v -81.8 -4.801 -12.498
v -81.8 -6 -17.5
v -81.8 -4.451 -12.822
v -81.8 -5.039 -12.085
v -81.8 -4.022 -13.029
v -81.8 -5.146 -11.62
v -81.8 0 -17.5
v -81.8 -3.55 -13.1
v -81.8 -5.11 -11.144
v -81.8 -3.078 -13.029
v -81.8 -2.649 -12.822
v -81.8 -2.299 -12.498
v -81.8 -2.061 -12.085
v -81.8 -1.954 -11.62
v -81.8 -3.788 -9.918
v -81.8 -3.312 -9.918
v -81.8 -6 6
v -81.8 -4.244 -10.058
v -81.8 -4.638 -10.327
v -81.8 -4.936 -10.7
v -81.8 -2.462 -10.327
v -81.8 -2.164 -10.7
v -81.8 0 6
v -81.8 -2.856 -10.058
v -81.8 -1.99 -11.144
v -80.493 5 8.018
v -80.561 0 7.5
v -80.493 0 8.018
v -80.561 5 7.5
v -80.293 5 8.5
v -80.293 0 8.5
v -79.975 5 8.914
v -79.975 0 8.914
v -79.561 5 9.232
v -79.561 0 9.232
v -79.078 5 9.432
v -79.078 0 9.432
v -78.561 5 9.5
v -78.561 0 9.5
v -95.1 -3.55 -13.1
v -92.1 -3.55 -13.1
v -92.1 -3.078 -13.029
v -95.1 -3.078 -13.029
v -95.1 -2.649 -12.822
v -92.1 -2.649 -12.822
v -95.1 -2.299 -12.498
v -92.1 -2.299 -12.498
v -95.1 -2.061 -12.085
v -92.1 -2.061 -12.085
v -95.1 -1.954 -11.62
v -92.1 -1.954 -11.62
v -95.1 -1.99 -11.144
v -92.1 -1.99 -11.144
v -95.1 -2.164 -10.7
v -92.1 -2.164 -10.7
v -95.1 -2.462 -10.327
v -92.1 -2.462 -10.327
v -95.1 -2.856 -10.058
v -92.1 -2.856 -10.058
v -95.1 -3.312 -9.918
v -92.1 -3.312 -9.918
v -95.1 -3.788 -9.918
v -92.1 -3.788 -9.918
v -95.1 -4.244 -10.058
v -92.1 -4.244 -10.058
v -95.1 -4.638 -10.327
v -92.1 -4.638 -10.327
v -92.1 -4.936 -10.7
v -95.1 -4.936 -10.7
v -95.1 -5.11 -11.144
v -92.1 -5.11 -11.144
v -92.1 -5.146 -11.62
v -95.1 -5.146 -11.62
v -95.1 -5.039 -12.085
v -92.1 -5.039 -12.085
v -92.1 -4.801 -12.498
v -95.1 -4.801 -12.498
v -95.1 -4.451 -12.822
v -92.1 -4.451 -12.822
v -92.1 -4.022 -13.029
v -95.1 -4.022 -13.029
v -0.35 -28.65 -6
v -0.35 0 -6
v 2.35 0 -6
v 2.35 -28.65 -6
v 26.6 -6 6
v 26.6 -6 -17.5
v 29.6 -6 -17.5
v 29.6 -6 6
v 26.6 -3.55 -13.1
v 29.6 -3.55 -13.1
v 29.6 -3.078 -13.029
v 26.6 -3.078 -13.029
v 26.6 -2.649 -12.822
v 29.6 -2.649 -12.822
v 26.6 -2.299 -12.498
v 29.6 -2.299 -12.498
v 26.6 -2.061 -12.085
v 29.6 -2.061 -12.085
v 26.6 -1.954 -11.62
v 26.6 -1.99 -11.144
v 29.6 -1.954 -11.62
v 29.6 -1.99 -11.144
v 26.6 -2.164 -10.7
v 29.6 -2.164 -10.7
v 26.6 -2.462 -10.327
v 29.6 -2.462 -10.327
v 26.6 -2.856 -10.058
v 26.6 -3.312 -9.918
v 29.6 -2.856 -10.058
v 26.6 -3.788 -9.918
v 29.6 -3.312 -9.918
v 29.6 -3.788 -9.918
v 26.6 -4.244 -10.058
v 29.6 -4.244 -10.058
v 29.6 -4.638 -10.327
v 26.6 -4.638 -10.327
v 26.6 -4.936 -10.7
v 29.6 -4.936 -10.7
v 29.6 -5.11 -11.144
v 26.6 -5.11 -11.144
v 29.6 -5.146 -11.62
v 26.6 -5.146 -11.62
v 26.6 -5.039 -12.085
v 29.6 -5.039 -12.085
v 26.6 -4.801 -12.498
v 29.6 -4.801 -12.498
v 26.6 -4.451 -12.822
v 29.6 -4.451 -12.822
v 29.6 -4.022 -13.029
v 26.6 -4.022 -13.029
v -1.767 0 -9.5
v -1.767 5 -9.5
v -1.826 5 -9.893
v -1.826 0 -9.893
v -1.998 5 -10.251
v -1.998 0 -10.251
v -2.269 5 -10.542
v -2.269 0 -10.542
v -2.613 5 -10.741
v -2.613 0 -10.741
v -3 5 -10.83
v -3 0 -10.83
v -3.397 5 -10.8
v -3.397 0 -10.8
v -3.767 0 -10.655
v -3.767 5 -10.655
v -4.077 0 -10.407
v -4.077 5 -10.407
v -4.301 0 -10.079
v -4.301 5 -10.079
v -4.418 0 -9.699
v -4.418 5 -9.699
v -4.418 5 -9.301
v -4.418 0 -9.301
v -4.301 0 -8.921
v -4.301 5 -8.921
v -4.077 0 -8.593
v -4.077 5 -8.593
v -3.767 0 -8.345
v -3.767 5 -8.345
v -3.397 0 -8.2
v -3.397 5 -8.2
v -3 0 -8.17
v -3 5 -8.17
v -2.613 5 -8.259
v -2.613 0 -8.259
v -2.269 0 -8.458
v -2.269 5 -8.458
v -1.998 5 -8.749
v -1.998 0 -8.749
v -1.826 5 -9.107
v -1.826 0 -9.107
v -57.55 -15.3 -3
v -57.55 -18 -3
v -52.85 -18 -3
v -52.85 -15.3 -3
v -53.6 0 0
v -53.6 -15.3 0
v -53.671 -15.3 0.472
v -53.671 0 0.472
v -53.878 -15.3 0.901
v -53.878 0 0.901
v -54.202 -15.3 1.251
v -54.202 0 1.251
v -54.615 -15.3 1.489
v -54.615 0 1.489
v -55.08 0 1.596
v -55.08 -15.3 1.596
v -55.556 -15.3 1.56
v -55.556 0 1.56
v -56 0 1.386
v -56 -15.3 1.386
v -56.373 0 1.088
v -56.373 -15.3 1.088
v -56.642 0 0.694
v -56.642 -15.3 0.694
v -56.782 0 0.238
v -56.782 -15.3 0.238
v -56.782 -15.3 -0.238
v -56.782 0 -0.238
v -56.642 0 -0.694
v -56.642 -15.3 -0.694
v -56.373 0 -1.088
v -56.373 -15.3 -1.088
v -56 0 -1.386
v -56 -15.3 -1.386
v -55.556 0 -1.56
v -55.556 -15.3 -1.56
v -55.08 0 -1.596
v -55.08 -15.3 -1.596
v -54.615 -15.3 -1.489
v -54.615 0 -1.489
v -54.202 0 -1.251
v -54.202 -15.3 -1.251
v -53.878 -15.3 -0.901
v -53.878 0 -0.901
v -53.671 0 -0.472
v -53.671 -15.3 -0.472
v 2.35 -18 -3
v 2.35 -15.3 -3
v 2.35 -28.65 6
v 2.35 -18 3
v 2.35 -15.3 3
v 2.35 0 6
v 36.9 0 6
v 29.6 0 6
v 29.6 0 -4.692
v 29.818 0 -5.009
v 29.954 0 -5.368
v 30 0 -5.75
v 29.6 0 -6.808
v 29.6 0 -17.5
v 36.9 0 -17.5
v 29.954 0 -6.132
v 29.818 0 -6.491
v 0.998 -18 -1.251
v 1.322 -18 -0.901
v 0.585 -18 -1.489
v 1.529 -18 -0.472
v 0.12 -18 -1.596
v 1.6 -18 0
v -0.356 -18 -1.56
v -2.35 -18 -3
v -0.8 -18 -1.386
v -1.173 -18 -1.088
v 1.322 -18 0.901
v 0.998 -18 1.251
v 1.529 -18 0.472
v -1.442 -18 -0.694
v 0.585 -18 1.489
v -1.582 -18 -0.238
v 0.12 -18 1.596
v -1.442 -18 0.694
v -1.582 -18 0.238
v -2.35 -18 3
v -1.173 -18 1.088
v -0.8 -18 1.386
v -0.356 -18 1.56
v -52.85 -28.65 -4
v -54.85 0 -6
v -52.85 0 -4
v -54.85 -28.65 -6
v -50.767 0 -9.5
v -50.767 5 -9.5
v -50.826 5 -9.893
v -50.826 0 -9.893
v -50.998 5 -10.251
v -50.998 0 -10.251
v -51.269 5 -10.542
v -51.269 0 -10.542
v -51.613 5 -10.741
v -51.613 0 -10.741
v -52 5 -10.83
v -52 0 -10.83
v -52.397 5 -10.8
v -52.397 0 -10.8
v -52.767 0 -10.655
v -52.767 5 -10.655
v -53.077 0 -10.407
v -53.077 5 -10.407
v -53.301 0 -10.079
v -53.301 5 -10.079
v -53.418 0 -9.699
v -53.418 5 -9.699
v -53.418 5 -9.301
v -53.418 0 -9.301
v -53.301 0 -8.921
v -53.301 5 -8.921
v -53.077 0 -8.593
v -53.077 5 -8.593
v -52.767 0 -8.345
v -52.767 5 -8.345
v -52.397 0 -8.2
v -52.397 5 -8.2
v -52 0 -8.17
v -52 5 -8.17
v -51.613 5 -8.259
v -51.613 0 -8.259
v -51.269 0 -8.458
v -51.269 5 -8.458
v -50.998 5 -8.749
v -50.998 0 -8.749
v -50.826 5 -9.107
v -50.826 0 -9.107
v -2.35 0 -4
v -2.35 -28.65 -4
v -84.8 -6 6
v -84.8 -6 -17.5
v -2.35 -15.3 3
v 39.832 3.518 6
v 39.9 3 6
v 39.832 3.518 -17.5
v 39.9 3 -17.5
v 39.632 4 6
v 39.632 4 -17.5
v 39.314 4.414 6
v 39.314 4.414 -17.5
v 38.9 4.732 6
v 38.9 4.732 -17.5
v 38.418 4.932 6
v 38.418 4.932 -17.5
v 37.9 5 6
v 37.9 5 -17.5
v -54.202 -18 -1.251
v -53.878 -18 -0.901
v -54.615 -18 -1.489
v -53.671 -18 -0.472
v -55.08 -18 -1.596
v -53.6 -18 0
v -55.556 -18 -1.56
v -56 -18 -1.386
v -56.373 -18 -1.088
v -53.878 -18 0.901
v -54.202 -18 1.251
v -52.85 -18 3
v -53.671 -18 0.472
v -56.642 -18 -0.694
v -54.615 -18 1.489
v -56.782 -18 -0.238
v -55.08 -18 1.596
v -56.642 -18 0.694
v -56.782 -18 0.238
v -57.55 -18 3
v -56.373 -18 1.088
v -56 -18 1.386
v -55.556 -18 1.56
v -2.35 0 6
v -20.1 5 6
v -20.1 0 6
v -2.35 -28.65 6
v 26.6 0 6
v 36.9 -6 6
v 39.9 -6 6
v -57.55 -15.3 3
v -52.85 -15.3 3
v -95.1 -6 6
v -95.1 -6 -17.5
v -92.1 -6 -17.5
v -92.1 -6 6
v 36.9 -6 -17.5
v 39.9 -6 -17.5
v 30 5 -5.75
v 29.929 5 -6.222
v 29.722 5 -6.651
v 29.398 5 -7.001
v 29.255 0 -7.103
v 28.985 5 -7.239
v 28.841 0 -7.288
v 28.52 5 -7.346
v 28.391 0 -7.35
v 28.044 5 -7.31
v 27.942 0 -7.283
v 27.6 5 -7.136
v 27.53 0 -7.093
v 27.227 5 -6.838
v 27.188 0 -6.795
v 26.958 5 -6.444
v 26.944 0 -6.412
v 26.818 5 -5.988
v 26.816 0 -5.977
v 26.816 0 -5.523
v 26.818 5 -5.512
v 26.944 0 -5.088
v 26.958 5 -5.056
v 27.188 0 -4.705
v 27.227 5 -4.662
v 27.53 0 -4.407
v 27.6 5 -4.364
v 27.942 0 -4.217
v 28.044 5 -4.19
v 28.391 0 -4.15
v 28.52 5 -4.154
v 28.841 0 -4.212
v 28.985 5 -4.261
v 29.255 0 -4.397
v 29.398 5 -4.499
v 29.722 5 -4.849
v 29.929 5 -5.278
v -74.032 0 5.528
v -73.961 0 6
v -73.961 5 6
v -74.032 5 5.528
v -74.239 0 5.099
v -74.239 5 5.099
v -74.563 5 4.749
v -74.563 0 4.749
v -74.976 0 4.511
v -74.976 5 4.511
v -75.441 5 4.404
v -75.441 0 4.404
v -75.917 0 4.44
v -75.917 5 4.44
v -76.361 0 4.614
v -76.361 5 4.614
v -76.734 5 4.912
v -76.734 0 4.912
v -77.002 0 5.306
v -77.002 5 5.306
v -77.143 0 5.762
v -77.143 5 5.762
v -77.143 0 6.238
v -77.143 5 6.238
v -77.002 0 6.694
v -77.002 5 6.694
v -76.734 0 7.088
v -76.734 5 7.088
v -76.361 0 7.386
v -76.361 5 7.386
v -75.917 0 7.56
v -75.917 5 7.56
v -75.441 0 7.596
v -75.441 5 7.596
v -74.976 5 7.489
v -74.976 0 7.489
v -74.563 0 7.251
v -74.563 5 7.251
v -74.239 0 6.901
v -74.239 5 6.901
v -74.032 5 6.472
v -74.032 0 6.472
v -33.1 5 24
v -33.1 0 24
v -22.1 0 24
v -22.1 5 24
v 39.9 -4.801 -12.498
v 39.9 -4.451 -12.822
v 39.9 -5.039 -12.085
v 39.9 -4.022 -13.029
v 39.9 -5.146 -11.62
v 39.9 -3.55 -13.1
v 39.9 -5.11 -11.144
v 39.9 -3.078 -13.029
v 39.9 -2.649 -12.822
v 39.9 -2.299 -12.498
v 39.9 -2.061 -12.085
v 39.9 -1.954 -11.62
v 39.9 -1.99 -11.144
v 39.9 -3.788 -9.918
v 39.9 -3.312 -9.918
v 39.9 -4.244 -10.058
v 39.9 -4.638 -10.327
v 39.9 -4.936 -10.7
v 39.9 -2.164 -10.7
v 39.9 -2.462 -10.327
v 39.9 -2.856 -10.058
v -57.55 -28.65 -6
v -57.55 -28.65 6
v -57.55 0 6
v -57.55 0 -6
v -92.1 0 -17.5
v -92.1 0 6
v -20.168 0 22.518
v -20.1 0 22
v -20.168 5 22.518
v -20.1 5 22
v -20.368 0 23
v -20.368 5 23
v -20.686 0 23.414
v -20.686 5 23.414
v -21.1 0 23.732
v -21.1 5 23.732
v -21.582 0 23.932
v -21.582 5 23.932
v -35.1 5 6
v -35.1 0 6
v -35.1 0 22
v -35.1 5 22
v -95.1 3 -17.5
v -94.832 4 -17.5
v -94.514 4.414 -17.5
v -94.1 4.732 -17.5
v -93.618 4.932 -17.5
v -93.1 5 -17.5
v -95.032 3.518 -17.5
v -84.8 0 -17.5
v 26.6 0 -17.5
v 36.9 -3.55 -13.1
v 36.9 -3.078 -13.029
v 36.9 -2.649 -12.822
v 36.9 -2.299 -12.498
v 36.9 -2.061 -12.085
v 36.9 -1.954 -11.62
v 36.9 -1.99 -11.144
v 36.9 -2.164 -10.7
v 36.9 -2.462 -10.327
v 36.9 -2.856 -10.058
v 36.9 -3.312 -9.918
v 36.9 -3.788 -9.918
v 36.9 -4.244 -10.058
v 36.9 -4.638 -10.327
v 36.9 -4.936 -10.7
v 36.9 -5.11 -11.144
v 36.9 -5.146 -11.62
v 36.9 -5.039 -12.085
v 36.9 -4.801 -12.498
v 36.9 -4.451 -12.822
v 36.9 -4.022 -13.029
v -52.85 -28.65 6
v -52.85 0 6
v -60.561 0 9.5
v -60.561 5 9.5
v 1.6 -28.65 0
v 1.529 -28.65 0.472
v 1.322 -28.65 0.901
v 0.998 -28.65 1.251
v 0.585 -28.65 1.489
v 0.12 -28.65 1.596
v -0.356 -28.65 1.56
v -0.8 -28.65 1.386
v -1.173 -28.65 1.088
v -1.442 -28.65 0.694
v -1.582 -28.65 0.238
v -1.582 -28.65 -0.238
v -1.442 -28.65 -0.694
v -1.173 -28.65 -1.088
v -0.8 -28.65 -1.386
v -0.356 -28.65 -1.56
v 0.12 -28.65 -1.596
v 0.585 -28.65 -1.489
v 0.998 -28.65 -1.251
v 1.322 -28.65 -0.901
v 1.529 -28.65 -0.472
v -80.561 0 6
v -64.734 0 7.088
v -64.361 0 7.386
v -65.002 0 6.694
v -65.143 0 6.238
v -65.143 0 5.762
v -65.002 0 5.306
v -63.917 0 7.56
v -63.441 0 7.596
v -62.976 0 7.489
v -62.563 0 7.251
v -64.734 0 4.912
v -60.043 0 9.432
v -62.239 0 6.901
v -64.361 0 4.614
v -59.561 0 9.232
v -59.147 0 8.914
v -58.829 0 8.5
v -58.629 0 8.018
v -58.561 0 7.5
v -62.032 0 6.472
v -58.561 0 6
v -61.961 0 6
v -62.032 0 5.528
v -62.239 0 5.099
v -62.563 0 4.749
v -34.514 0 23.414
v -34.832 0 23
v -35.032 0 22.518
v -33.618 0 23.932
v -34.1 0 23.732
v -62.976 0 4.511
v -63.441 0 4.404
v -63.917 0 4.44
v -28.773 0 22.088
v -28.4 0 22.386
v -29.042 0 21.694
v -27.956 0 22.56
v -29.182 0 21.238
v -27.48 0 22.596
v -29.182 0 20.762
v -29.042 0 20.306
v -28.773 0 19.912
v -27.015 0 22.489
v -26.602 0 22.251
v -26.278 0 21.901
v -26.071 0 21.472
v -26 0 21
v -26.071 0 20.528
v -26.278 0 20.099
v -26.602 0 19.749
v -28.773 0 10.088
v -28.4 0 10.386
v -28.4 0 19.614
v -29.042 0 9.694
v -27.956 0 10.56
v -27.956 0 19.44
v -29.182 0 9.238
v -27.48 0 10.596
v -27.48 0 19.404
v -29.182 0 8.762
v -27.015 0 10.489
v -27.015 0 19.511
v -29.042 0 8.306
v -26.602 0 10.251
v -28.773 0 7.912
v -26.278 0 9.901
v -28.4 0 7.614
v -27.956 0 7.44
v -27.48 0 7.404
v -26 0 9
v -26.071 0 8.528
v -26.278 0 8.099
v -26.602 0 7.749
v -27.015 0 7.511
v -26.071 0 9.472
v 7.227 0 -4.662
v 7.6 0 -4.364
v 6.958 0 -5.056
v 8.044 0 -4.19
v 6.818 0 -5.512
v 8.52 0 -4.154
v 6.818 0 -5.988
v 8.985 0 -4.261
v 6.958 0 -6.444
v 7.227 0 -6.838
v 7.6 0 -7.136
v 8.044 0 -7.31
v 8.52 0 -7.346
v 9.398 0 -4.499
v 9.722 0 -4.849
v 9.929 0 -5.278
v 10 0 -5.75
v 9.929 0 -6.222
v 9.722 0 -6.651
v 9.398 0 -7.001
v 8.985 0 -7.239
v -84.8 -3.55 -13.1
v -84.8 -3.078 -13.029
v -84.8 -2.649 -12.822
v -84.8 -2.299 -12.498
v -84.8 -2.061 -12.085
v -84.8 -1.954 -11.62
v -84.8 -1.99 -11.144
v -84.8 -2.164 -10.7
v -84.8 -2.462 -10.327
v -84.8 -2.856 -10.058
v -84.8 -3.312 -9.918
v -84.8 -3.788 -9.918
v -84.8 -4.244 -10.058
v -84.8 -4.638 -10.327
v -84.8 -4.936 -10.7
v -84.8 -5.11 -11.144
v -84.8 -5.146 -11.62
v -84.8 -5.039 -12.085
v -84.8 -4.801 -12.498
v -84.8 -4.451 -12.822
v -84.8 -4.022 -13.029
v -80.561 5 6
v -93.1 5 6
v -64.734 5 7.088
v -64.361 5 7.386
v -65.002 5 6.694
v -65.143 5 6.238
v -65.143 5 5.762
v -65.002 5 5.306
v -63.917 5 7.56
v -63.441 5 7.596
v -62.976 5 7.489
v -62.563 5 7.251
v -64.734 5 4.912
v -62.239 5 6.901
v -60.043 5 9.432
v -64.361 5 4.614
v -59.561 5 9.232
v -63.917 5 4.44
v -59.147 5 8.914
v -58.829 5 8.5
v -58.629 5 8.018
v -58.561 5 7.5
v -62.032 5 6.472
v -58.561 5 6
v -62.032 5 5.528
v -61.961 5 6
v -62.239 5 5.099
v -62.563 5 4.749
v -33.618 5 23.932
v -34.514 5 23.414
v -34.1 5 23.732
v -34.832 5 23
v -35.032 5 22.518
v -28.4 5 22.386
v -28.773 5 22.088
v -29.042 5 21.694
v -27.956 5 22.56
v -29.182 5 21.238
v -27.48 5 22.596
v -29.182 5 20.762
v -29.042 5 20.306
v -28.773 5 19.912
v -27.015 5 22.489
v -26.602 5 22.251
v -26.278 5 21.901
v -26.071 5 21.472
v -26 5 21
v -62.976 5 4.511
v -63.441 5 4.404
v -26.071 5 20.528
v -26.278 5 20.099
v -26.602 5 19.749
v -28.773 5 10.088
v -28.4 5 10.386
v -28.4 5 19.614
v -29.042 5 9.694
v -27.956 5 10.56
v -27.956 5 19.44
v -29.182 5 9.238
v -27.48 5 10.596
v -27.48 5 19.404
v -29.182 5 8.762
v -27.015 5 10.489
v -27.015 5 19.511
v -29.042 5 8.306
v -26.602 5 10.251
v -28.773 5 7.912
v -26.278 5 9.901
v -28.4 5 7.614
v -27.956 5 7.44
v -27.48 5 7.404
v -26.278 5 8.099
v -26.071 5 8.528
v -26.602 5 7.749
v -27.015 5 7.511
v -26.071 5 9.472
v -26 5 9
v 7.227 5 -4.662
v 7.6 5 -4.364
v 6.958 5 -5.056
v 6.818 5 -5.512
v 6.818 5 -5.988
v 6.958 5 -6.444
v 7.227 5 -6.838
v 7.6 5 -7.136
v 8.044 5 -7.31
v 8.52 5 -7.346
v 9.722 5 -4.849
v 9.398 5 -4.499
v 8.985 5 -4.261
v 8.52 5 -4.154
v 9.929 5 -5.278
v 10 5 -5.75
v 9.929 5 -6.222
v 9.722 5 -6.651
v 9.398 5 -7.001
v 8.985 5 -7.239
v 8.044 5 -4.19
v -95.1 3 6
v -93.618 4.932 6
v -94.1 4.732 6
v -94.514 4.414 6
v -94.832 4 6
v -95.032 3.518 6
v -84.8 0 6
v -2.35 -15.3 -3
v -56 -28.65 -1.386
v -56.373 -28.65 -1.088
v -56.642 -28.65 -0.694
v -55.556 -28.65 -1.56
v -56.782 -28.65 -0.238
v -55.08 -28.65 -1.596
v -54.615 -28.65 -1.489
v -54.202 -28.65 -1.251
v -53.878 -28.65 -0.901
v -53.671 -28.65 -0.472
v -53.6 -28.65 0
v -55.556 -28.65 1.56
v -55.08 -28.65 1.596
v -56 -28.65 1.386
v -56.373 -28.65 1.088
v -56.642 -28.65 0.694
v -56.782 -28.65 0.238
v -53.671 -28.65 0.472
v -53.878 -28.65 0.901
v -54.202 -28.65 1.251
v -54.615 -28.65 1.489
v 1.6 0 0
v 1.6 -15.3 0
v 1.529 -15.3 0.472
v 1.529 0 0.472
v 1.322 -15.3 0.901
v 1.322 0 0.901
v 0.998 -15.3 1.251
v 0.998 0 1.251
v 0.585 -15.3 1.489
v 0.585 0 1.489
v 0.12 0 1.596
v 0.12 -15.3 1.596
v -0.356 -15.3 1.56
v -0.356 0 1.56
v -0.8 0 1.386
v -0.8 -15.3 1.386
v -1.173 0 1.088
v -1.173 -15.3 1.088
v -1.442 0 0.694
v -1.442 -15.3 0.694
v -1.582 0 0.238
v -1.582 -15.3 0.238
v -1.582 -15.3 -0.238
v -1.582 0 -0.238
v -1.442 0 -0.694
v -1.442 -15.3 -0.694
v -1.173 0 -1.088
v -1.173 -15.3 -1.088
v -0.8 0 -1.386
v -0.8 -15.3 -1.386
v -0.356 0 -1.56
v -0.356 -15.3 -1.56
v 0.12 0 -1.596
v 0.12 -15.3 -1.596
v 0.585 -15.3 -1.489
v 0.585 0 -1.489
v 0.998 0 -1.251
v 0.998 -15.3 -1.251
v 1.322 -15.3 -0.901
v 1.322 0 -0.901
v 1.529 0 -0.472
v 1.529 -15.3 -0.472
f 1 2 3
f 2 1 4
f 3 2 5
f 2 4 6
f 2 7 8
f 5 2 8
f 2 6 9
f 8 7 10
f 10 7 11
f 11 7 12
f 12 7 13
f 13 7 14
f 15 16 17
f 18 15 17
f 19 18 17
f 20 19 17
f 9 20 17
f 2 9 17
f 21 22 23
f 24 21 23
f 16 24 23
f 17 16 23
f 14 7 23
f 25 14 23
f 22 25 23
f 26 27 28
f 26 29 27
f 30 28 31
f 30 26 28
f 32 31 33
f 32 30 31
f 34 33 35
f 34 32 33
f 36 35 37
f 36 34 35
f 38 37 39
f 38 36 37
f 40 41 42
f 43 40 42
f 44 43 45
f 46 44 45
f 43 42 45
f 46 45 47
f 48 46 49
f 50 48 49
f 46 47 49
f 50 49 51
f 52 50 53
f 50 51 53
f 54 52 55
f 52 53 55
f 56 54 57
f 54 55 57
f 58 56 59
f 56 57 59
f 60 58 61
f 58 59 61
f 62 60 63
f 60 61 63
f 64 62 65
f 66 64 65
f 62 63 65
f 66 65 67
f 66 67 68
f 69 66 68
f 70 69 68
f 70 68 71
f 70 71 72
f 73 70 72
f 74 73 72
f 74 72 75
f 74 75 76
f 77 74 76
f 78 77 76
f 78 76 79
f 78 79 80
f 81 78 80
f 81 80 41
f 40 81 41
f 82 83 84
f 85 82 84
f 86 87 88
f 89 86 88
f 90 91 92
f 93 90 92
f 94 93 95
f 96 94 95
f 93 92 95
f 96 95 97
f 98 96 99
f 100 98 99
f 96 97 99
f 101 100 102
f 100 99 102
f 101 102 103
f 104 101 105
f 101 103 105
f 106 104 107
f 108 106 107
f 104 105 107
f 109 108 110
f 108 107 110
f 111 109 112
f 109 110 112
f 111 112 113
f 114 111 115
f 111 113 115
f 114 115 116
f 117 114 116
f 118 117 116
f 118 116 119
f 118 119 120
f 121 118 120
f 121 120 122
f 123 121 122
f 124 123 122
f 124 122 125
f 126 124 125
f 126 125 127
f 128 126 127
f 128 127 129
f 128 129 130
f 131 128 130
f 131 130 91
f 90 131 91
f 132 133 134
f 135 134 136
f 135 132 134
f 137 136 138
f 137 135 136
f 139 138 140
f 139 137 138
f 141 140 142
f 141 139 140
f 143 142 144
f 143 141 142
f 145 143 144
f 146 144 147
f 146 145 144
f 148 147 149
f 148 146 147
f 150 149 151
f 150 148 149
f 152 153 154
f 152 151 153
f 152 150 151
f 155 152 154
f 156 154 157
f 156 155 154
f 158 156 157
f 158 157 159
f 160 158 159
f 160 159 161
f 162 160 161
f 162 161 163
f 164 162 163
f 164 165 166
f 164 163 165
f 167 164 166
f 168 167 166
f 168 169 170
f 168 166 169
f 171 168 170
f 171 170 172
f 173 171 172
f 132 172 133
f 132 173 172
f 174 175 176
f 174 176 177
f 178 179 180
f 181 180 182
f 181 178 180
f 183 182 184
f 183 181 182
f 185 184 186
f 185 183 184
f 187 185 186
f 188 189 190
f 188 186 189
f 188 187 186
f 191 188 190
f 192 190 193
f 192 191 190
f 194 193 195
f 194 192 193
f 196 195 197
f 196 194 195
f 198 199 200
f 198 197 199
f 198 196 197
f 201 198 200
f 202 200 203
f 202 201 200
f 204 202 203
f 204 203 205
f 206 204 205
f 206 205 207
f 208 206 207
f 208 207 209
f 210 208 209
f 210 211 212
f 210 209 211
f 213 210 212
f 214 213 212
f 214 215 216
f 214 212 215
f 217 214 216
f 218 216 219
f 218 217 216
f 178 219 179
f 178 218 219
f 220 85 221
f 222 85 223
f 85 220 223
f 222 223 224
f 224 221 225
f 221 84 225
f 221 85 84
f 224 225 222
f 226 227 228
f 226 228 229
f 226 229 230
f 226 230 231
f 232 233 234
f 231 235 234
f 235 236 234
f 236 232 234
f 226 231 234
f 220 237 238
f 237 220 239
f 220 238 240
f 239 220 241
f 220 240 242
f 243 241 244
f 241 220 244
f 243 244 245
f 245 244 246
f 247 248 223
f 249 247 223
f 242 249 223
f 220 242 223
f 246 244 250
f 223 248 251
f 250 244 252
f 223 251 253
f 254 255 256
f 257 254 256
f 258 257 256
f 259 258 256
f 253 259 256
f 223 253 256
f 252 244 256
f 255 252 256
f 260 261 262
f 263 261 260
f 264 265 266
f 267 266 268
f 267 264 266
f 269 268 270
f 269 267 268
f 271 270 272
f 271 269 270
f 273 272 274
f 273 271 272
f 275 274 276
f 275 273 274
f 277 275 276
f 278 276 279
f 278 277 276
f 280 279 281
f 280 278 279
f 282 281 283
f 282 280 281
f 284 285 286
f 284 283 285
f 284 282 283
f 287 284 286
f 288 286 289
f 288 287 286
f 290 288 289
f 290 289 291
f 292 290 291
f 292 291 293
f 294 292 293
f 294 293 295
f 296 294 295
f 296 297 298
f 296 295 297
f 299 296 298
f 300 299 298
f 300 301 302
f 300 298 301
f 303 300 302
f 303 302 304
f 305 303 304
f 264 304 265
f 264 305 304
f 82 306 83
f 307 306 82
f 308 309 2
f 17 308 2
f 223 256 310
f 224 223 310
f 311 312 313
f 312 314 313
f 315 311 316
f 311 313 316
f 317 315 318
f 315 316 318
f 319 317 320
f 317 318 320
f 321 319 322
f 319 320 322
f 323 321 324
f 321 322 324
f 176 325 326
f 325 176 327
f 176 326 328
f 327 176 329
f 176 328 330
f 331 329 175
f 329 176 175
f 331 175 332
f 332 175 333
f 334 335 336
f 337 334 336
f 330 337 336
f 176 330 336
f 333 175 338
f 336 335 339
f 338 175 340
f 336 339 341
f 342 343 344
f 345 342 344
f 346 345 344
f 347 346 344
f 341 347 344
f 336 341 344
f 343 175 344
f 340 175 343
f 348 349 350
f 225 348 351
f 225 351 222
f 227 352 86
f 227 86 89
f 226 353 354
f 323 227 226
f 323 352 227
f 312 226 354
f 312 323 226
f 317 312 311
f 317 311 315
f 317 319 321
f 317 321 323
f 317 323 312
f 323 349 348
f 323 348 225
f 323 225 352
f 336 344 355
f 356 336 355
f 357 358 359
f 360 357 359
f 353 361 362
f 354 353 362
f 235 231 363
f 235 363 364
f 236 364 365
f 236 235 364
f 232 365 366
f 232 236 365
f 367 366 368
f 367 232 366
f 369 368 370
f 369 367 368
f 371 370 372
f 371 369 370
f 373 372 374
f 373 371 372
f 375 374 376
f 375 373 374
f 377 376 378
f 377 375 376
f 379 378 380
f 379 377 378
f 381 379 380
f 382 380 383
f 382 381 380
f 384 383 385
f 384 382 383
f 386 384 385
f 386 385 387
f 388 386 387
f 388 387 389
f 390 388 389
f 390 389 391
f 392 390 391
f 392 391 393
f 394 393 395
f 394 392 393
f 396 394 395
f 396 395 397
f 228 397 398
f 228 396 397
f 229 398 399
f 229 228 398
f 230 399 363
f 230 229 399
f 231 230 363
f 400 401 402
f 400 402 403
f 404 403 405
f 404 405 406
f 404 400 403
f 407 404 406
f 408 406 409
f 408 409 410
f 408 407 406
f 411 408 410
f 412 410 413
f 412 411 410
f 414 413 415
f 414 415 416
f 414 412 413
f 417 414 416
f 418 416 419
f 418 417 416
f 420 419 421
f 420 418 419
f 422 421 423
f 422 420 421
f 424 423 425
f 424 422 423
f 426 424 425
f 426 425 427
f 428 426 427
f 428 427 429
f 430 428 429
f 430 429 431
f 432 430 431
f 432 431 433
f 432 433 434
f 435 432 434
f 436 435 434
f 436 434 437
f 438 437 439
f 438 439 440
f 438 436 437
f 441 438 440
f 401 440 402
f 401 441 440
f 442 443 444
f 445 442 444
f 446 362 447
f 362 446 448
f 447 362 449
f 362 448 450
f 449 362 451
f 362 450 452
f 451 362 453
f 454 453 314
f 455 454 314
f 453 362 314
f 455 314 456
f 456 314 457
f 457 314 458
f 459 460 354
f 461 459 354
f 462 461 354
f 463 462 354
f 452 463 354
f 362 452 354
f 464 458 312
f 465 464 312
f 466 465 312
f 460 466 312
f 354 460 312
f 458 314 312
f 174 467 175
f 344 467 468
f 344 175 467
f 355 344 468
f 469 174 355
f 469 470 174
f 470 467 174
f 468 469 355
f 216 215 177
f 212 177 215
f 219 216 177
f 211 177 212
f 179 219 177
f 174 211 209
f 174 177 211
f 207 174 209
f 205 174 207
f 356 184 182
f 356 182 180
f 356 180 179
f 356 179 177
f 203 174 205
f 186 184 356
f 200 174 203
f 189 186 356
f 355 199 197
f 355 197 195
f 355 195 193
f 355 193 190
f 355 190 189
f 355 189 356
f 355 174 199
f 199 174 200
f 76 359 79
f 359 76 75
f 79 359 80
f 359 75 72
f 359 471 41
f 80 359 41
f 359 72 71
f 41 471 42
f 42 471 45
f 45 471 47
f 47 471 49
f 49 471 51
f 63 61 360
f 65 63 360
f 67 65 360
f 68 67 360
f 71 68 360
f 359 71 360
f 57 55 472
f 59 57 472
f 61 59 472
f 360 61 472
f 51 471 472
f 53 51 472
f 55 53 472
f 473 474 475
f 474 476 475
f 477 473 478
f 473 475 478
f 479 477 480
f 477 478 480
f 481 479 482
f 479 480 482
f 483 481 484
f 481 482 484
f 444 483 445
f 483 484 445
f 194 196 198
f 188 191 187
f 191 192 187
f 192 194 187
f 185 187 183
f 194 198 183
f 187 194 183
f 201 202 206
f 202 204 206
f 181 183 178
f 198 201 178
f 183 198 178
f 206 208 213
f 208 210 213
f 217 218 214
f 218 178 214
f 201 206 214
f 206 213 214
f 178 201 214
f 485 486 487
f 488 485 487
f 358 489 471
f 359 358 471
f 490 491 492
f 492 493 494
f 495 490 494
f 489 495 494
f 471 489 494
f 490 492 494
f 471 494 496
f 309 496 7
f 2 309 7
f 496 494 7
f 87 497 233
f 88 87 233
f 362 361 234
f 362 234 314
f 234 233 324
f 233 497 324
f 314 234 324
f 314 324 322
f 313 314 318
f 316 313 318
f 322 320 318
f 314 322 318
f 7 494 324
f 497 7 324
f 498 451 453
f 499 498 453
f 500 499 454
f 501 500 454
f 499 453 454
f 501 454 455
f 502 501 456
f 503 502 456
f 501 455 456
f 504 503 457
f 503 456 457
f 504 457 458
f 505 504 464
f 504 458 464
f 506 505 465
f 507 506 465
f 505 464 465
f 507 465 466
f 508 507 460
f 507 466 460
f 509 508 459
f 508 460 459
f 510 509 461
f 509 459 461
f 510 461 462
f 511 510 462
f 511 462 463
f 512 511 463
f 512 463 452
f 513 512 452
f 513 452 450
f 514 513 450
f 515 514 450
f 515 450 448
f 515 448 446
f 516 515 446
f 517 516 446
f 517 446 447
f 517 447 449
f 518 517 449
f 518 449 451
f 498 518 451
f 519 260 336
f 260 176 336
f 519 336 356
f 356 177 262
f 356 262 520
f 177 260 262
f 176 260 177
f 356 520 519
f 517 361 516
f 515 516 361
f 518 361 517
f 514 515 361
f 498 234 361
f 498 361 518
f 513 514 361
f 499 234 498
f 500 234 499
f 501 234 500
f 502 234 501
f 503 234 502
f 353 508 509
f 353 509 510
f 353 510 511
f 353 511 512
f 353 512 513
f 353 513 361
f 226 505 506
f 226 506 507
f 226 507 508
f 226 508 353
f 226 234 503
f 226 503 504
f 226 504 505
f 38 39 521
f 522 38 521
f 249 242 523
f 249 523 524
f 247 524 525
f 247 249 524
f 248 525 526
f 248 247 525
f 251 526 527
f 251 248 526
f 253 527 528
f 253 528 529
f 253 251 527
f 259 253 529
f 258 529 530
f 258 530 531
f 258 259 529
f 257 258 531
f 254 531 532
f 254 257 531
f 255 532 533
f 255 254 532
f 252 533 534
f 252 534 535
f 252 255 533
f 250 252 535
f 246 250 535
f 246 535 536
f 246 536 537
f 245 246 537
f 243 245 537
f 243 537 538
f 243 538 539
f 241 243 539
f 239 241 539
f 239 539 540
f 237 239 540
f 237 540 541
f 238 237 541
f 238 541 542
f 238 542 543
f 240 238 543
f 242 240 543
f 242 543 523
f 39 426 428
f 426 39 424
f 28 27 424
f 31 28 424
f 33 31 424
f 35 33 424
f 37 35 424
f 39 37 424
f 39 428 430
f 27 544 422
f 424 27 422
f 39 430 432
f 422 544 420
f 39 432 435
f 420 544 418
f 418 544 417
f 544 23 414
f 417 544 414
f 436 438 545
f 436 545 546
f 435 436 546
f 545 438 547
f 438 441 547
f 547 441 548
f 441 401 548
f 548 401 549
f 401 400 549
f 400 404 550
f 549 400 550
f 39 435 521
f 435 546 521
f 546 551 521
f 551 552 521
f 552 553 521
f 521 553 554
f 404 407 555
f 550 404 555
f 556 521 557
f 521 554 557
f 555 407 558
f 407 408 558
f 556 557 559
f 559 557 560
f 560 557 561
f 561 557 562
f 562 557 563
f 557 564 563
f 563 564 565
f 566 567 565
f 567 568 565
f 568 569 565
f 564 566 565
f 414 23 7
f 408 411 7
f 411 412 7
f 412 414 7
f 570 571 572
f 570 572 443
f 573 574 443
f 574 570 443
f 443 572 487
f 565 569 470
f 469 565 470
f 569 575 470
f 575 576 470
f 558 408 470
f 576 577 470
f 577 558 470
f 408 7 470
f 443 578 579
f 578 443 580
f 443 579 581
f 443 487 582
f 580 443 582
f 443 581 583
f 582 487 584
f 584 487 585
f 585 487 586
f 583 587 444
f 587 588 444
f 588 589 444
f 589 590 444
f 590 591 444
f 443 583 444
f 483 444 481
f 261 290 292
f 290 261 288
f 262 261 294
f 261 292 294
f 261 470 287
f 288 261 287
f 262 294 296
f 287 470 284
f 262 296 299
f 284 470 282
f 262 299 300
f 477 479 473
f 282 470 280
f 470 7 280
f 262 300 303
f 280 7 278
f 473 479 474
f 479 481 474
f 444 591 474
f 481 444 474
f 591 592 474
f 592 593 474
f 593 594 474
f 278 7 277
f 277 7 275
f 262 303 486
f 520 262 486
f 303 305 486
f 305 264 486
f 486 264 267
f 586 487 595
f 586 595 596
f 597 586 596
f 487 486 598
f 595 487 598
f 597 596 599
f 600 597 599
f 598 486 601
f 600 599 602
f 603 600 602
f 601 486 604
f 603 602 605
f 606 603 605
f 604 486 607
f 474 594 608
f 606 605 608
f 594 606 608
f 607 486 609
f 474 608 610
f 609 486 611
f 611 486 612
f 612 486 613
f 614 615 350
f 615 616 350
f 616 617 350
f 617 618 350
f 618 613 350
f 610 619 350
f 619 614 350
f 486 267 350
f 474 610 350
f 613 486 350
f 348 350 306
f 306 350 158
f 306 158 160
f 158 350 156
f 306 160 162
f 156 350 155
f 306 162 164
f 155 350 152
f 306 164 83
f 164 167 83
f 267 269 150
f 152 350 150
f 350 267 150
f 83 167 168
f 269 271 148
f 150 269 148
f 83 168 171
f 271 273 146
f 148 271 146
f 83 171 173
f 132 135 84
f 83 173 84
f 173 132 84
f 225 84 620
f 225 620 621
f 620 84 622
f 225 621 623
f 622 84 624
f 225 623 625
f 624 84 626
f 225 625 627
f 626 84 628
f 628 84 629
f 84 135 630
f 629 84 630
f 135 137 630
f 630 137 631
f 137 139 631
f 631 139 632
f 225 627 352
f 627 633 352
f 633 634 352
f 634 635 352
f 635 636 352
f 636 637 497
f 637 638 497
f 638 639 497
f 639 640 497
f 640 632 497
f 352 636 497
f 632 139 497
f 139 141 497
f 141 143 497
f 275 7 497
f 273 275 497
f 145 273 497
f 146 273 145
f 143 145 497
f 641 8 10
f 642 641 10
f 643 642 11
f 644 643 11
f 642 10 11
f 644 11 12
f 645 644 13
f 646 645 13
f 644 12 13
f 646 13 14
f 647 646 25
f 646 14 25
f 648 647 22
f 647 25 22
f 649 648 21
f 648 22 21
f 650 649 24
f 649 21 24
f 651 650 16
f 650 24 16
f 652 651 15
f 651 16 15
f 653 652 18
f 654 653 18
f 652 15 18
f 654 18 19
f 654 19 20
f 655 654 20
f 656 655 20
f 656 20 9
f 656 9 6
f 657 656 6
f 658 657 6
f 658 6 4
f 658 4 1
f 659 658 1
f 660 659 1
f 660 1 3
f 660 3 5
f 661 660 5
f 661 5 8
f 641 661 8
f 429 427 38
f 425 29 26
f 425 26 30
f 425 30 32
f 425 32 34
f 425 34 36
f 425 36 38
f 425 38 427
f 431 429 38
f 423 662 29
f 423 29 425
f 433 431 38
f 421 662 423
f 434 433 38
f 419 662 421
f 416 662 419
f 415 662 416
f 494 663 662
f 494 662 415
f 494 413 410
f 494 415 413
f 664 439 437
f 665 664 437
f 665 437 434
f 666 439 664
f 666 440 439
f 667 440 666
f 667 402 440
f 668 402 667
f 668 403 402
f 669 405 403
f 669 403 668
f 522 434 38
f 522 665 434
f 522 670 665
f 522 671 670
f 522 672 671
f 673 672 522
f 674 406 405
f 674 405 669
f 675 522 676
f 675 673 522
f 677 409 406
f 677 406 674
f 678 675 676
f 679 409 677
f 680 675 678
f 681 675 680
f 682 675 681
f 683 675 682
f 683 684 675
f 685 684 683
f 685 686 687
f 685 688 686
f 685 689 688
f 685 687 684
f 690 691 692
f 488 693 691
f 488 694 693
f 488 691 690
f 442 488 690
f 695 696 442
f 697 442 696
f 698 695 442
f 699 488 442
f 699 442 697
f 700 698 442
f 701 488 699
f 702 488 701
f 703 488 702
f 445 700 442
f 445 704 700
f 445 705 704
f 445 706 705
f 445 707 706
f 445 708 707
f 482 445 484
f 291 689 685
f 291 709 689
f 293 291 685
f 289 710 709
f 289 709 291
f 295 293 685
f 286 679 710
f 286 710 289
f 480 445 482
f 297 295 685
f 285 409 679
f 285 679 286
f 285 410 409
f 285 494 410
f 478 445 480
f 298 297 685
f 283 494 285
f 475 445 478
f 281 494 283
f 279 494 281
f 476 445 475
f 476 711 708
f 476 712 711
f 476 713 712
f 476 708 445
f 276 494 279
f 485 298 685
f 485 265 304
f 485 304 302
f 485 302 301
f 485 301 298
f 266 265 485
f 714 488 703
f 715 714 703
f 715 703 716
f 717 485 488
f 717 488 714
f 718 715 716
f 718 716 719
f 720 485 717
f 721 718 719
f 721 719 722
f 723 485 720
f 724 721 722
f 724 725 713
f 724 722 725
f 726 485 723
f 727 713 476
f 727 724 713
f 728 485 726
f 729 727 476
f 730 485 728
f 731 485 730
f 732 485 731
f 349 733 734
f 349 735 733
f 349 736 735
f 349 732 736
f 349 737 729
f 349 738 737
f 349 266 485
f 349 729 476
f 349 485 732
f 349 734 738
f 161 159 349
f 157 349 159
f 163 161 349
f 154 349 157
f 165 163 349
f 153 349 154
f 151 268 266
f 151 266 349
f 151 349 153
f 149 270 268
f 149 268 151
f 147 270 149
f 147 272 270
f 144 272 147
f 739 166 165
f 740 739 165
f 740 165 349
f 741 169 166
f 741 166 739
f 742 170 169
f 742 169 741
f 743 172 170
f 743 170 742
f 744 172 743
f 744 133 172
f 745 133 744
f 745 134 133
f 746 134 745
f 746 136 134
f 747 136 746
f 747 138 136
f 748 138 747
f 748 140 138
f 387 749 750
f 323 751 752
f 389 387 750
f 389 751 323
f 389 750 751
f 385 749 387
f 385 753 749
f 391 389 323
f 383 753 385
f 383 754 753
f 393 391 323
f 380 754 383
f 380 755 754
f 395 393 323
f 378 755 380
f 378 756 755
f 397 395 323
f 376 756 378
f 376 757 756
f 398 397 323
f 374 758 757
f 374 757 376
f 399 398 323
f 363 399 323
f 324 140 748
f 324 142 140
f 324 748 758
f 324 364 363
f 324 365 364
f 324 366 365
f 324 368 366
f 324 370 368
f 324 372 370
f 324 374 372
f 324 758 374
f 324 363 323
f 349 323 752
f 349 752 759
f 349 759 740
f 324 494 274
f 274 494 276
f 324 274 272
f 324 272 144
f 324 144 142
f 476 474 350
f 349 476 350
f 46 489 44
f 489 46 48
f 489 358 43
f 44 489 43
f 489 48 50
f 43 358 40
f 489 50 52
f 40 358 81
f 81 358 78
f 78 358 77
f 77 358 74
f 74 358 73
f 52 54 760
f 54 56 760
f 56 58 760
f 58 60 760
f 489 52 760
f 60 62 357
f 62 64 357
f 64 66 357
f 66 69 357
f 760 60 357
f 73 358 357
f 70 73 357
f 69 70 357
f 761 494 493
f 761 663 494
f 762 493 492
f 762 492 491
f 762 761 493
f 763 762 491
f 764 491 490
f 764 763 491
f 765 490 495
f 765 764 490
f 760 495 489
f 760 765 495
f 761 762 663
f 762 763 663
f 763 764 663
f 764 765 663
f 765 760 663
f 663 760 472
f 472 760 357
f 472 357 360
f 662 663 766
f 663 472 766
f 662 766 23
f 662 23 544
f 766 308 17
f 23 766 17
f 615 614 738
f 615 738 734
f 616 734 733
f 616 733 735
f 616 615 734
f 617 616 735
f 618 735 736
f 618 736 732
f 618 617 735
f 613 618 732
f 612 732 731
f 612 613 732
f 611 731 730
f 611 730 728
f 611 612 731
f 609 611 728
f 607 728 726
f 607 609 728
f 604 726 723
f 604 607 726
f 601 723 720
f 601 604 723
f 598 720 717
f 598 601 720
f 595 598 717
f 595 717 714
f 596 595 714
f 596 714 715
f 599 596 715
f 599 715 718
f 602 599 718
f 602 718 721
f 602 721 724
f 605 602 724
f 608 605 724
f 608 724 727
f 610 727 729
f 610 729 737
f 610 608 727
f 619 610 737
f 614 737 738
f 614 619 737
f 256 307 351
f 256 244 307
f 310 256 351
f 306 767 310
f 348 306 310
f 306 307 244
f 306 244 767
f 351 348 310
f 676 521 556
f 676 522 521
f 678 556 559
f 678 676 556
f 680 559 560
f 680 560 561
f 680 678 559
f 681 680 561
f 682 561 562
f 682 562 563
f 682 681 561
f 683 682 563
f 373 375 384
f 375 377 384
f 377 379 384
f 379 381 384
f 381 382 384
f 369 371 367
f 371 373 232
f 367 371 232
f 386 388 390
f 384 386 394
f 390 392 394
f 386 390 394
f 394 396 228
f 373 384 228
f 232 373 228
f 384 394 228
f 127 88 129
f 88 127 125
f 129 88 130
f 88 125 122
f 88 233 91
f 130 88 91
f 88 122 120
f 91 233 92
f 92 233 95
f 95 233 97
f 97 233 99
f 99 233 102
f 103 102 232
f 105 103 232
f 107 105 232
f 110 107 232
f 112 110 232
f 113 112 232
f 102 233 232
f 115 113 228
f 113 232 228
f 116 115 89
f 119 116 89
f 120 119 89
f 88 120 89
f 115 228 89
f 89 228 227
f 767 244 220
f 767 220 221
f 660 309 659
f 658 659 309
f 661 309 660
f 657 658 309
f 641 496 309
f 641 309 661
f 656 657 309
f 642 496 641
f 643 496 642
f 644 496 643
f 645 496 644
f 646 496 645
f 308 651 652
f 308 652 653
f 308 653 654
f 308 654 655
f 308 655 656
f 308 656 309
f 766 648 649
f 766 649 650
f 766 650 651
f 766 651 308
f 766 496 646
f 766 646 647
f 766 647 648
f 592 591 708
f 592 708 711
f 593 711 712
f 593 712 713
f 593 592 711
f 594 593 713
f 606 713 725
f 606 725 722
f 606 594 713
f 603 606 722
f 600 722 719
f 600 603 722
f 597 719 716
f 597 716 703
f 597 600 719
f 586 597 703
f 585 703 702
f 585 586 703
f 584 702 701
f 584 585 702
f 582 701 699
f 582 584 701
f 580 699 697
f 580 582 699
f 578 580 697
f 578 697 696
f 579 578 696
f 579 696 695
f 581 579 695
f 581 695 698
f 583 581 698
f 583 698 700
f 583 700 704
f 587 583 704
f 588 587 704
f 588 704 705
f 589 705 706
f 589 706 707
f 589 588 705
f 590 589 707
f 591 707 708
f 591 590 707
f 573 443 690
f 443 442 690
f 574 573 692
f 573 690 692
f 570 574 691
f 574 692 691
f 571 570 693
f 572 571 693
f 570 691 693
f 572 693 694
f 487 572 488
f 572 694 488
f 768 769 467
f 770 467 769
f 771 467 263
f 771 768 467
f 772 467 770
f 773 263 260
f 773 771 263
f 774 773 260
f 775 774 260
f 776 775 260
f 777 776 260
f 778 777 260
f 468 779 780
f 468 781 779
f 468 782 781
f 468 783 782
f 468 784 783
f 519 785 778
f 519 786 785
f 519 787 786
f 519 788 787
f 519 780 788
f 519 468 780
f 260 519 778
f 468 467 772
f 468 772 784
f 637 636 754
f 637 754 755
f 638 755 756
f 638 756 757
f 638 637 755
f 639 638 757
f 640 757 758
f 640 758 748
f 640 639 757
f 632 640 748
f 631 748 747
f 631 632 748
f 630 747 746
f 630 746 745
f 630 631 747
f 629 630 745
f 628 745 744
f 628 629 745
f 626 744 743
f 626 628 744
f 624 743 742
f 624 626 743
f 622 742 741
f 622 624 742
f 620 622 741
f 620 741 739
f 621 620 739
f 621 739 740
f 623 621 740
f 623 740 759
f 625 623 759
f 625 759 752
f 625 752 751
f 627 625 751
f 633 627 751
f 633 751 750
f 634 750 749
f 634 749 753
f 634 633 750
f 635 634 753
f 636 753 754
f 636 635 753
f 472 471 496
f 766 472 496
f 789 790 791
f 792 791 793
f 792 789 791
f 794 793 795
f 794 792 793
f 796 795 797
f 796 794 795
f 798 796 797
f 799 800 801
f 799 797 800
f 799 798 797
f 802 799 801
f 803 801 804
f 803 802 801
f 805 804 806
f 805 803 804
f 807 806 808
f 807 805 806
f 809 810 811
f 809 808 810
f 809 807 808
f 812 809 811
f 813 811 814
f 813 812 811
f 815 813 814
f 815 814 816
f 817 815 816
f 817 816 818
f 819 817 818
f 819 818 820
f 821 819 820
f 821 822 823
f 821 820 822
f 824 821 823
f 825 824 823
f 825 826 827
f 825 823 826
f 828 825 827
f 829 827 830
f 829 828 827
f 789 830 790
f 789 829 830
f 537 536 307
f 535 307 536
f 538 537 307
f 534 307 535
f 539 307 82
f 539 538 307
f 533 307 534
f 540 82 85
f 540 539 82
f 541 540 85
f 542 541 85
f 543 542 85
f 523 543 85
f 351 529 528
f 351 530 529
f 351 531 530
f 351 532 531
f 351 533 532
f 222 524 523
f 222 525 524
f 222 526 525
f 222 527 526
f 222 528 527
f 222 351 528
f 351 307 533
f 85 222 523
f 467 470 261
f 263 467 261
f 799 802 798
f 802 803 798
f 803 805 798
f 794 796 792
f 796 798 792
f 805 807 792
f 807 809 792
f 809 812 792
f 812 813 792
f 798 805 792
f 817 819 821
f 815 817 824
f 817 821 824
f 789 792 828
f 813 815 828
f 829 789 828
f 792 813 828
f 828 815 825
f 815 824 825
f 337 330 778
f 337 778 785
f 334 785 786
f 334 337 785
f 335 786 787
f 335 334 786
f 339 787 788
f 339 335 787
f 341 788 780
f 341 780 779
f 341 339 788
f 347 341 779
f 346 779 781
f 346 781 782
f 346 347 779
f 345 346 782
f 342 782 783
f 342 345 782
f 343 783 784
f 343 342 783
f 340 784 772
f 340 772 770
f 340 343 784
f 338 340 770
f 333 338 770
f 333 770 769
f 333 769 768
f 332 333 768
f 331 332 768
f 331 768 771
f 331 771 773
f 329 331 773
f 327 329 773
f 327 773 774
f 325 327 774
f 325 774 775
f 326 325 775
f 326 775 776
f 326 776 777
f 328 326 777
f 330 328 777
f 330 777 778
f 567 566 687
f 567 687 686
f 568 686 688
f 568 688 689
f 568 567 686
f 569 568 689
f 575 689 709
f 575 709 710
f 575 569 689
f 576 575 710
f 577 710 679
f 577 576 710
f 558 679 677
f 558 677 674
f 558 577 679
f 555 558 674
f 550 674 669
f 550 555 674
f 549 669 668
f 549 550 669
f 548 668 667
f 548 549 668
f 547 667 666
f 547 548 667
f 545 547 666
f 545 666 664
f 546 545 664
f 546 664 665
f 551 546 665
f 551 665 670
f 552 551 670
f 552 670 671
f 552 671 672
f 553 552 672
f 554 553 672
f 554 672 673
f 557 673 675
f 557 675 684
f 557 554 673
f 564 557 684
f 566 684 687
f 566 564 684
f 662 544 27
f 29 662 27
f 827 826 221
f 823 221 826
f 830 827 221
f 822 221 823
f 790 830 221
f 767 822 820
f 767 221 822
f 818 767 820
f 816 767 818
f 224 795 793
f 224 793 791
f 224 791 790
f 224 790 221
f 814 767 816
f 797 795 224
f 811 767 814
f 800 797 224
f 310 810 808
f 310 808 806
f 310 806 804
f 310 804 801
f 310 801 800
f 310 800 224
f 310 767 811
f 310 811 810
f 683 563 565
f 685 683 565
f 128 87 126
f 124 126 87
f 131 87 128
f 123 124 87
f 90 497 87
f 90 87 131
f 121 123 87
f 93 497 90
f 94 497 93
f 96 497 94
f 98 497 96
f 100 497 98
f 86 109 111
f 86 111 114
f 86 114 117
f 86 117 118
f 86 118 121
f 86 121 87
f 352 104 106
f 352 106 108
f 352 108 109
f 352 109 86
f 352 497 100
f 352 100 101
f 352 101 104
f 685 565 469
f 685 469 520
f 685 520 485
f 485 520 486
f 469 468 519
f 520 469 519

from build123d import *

# Parameters (mm, degrees)
SKETCH3_R           = 1.6
BOSS_EXTRUDE1_DEPTH = 5
SKETCH4_W           = 3
SKETCH4_H           = 23.5
BOSS_EXTRUDE2_DEPTH = 6
SKETCH5_R           = 1.6
CUT_EXTRUDE1_DEPTH  = 138.247950804
SKETCH6_W           = 4.7
SKETCH6_H           = 12
SKETCH6_R           = 1.6
BOSS_EXTRUDE3_DEPTH = 28.65
SKETCH8_W           = 6
SKETCH8_H           = 2.7
CUT_EXTRUDE3_DEPTH  = 105.371092741
FILLET1_R           = 2
CHAMFER1_SIZE       = 2
SKETCH9_R           = 1.333333333
CUT_EXTRUDE4_DEPTH  = 25
FILLET2_R           = 2


with BuildPart() as part:
    # Sketch3 → Boss-Extrude1 (new body)
    with BuildSketch(Plane(origin=(0, 0, 0), x_dir=(1, 0, 0), z_dir=(0, 1, 0))):
        Polygon((39.9, 17.5), (-95.1, 17.5), (-95.1, -6), (-80.560784084, -6), (-80.560784084, -9.5), (-58.560784084, -9.5), (-58.560784084, -6), (-35.1, -6), (-35.1, -24), (-20.1, -24), (-20.1, -6), (39.9, -6), align=None)
        with Locations((-63.560784084, -6)):
            Circle(SKETCH3_R, mode=Mode.SUBTRACT)
        with Locations((-75.560784084, -6)):
            Circle(SKETCH3_R, mode=Mode.SUBTRACT)
        with Locations((8.4, 5.75)):
            Circle(SKETCH3_R, mode=Mode.SUBTRACT)
        with Locations((28.4, 5.75)):
            Circle(SKETCH3_R, mode=Mode.SUBTRACT)
        with Locations((-27.6, -9)):
            Circle(SKETCH3_R, mode=Mode.SUBTRACT)
        with Locations((-27.6, -21)):
            Circle(SKETCH3_R, mode=Mode.SUBTRACT)
    extrude(amount=BOSS_EXTRUDE1_DEPTH)

    # Sketch4 → Boss-Extrude2 (add)
    with BuildSketch(Plane.XZ):
        with Locations((38.4, -5.75)):
            Rectangle(SKETCH4_W, SKETCH4_H)
        with Locations((28.1, -5.75)):
            Rectangle(SKETCH4_W, SKETCH4_H)
        with Locations((-93.6, -5.75)):
            Rectangle(SKETCH4_W, SKETCH4_H)
        with Locations((-83.3, -5.75)):
            Rectangle(SKETCH4_W, SKETCH4_H)
    extrude(amount=BOSS_EXTRUDE2_DEPTH)

    # Sketch5 → Cut-Extrude1 (cut, through all)
    with BuildSketch(Plane(origin=(39.9, 0, 0), x_dir=(0, 0, -1), z_dir=(1, 0, 0))):
        with Locations((11.5, -3.55)):
            Circle(SKETCH5_R)
    extrude(amount=-CUT_EXTRUDE1_DEPTH, mode=Mode.SUBTRACT)

    # Sketch6 → Boss-Extrude3 (add)
    # profile 1 of 2: a face of its own
    with BuildSketch(Plane.XZ):
        with Locations((-55.2, 0)):
            Rectangle(SKETCH6_W, SKETCH6_H)
        with Locations((-55.2, 0)):
            Circle(SKETCH6_R, mode=Mode.SUBTRACT)
    # profile 2 of 2: a face of its own
    with BuildSketch(Plane.XZ):
        Rectangle(SKETCH6_W, SKETCH6_H)
        Circle(SKETCH6_R, mode=Mode.SUBTRACT)
    extrude(amount=BOSS_EXTRUDE3_DEPTH)

    # Sketch8 → Cut-Extrude3 (cut, through all)
    with BuildSketch(Plane.ZY.offset(57.55)):
        with Locations((0, -16.65)):
            Rectangle(SKETCH8_W, SKETCH8_H)
    extrude(amount=-CUT_EXTRUDE3_DEPTH, mode=Mode.SUBTRACT)

    # Fillet1
    fillet1_edges = [part.edges().sort_by_distance(p)[0] for p in [
        (39.9, 5, -5.75),
        (-95.1, 5, -5.75),
    ]]
    fillet(fillet1_edges, radius=FILLET1_R)

    # Chamfer1
    chamfer1_edges = [part.edges().sort_by_distance(p)[0] for p in [
        (-2.35, -14.325, -6),
        (-52.85, -14.325, -6),
    ]]
    chamfer(chamfer1_edges, length=CHAMFER1_SIZE)

    # Sketch9 → Cut-Extrude4 (cut)
    with BuildSketch(Plane(origin=(0, 0, 0), x_dir=(1, 0, 0), z_dir=(0, 1, 0))):
        with Locations((-3.1, 9.5)):
            Circle(SKETCH9_R)
        with Locations((-52.1, 9.5)):
            Circle(SKETCH9_R)
    extrude(amount=CUT_EXTRUDE4_DEPTH, mode=Mode.SUBTRACT)

    # Fillet2
    fillet2_edges = [part.edges().sort_by_distance(p)[0] for p in [
        (-20.1, 2.5, 24),
        (-35.1, 2.5, 24),
        (-80.560784084, 2.5, 9.5),
        (-58.560784084, 2.5, 9.5),
    ]]
    fillet(fillet2_edges, radius=FILLET2_R)


solid = part.part
